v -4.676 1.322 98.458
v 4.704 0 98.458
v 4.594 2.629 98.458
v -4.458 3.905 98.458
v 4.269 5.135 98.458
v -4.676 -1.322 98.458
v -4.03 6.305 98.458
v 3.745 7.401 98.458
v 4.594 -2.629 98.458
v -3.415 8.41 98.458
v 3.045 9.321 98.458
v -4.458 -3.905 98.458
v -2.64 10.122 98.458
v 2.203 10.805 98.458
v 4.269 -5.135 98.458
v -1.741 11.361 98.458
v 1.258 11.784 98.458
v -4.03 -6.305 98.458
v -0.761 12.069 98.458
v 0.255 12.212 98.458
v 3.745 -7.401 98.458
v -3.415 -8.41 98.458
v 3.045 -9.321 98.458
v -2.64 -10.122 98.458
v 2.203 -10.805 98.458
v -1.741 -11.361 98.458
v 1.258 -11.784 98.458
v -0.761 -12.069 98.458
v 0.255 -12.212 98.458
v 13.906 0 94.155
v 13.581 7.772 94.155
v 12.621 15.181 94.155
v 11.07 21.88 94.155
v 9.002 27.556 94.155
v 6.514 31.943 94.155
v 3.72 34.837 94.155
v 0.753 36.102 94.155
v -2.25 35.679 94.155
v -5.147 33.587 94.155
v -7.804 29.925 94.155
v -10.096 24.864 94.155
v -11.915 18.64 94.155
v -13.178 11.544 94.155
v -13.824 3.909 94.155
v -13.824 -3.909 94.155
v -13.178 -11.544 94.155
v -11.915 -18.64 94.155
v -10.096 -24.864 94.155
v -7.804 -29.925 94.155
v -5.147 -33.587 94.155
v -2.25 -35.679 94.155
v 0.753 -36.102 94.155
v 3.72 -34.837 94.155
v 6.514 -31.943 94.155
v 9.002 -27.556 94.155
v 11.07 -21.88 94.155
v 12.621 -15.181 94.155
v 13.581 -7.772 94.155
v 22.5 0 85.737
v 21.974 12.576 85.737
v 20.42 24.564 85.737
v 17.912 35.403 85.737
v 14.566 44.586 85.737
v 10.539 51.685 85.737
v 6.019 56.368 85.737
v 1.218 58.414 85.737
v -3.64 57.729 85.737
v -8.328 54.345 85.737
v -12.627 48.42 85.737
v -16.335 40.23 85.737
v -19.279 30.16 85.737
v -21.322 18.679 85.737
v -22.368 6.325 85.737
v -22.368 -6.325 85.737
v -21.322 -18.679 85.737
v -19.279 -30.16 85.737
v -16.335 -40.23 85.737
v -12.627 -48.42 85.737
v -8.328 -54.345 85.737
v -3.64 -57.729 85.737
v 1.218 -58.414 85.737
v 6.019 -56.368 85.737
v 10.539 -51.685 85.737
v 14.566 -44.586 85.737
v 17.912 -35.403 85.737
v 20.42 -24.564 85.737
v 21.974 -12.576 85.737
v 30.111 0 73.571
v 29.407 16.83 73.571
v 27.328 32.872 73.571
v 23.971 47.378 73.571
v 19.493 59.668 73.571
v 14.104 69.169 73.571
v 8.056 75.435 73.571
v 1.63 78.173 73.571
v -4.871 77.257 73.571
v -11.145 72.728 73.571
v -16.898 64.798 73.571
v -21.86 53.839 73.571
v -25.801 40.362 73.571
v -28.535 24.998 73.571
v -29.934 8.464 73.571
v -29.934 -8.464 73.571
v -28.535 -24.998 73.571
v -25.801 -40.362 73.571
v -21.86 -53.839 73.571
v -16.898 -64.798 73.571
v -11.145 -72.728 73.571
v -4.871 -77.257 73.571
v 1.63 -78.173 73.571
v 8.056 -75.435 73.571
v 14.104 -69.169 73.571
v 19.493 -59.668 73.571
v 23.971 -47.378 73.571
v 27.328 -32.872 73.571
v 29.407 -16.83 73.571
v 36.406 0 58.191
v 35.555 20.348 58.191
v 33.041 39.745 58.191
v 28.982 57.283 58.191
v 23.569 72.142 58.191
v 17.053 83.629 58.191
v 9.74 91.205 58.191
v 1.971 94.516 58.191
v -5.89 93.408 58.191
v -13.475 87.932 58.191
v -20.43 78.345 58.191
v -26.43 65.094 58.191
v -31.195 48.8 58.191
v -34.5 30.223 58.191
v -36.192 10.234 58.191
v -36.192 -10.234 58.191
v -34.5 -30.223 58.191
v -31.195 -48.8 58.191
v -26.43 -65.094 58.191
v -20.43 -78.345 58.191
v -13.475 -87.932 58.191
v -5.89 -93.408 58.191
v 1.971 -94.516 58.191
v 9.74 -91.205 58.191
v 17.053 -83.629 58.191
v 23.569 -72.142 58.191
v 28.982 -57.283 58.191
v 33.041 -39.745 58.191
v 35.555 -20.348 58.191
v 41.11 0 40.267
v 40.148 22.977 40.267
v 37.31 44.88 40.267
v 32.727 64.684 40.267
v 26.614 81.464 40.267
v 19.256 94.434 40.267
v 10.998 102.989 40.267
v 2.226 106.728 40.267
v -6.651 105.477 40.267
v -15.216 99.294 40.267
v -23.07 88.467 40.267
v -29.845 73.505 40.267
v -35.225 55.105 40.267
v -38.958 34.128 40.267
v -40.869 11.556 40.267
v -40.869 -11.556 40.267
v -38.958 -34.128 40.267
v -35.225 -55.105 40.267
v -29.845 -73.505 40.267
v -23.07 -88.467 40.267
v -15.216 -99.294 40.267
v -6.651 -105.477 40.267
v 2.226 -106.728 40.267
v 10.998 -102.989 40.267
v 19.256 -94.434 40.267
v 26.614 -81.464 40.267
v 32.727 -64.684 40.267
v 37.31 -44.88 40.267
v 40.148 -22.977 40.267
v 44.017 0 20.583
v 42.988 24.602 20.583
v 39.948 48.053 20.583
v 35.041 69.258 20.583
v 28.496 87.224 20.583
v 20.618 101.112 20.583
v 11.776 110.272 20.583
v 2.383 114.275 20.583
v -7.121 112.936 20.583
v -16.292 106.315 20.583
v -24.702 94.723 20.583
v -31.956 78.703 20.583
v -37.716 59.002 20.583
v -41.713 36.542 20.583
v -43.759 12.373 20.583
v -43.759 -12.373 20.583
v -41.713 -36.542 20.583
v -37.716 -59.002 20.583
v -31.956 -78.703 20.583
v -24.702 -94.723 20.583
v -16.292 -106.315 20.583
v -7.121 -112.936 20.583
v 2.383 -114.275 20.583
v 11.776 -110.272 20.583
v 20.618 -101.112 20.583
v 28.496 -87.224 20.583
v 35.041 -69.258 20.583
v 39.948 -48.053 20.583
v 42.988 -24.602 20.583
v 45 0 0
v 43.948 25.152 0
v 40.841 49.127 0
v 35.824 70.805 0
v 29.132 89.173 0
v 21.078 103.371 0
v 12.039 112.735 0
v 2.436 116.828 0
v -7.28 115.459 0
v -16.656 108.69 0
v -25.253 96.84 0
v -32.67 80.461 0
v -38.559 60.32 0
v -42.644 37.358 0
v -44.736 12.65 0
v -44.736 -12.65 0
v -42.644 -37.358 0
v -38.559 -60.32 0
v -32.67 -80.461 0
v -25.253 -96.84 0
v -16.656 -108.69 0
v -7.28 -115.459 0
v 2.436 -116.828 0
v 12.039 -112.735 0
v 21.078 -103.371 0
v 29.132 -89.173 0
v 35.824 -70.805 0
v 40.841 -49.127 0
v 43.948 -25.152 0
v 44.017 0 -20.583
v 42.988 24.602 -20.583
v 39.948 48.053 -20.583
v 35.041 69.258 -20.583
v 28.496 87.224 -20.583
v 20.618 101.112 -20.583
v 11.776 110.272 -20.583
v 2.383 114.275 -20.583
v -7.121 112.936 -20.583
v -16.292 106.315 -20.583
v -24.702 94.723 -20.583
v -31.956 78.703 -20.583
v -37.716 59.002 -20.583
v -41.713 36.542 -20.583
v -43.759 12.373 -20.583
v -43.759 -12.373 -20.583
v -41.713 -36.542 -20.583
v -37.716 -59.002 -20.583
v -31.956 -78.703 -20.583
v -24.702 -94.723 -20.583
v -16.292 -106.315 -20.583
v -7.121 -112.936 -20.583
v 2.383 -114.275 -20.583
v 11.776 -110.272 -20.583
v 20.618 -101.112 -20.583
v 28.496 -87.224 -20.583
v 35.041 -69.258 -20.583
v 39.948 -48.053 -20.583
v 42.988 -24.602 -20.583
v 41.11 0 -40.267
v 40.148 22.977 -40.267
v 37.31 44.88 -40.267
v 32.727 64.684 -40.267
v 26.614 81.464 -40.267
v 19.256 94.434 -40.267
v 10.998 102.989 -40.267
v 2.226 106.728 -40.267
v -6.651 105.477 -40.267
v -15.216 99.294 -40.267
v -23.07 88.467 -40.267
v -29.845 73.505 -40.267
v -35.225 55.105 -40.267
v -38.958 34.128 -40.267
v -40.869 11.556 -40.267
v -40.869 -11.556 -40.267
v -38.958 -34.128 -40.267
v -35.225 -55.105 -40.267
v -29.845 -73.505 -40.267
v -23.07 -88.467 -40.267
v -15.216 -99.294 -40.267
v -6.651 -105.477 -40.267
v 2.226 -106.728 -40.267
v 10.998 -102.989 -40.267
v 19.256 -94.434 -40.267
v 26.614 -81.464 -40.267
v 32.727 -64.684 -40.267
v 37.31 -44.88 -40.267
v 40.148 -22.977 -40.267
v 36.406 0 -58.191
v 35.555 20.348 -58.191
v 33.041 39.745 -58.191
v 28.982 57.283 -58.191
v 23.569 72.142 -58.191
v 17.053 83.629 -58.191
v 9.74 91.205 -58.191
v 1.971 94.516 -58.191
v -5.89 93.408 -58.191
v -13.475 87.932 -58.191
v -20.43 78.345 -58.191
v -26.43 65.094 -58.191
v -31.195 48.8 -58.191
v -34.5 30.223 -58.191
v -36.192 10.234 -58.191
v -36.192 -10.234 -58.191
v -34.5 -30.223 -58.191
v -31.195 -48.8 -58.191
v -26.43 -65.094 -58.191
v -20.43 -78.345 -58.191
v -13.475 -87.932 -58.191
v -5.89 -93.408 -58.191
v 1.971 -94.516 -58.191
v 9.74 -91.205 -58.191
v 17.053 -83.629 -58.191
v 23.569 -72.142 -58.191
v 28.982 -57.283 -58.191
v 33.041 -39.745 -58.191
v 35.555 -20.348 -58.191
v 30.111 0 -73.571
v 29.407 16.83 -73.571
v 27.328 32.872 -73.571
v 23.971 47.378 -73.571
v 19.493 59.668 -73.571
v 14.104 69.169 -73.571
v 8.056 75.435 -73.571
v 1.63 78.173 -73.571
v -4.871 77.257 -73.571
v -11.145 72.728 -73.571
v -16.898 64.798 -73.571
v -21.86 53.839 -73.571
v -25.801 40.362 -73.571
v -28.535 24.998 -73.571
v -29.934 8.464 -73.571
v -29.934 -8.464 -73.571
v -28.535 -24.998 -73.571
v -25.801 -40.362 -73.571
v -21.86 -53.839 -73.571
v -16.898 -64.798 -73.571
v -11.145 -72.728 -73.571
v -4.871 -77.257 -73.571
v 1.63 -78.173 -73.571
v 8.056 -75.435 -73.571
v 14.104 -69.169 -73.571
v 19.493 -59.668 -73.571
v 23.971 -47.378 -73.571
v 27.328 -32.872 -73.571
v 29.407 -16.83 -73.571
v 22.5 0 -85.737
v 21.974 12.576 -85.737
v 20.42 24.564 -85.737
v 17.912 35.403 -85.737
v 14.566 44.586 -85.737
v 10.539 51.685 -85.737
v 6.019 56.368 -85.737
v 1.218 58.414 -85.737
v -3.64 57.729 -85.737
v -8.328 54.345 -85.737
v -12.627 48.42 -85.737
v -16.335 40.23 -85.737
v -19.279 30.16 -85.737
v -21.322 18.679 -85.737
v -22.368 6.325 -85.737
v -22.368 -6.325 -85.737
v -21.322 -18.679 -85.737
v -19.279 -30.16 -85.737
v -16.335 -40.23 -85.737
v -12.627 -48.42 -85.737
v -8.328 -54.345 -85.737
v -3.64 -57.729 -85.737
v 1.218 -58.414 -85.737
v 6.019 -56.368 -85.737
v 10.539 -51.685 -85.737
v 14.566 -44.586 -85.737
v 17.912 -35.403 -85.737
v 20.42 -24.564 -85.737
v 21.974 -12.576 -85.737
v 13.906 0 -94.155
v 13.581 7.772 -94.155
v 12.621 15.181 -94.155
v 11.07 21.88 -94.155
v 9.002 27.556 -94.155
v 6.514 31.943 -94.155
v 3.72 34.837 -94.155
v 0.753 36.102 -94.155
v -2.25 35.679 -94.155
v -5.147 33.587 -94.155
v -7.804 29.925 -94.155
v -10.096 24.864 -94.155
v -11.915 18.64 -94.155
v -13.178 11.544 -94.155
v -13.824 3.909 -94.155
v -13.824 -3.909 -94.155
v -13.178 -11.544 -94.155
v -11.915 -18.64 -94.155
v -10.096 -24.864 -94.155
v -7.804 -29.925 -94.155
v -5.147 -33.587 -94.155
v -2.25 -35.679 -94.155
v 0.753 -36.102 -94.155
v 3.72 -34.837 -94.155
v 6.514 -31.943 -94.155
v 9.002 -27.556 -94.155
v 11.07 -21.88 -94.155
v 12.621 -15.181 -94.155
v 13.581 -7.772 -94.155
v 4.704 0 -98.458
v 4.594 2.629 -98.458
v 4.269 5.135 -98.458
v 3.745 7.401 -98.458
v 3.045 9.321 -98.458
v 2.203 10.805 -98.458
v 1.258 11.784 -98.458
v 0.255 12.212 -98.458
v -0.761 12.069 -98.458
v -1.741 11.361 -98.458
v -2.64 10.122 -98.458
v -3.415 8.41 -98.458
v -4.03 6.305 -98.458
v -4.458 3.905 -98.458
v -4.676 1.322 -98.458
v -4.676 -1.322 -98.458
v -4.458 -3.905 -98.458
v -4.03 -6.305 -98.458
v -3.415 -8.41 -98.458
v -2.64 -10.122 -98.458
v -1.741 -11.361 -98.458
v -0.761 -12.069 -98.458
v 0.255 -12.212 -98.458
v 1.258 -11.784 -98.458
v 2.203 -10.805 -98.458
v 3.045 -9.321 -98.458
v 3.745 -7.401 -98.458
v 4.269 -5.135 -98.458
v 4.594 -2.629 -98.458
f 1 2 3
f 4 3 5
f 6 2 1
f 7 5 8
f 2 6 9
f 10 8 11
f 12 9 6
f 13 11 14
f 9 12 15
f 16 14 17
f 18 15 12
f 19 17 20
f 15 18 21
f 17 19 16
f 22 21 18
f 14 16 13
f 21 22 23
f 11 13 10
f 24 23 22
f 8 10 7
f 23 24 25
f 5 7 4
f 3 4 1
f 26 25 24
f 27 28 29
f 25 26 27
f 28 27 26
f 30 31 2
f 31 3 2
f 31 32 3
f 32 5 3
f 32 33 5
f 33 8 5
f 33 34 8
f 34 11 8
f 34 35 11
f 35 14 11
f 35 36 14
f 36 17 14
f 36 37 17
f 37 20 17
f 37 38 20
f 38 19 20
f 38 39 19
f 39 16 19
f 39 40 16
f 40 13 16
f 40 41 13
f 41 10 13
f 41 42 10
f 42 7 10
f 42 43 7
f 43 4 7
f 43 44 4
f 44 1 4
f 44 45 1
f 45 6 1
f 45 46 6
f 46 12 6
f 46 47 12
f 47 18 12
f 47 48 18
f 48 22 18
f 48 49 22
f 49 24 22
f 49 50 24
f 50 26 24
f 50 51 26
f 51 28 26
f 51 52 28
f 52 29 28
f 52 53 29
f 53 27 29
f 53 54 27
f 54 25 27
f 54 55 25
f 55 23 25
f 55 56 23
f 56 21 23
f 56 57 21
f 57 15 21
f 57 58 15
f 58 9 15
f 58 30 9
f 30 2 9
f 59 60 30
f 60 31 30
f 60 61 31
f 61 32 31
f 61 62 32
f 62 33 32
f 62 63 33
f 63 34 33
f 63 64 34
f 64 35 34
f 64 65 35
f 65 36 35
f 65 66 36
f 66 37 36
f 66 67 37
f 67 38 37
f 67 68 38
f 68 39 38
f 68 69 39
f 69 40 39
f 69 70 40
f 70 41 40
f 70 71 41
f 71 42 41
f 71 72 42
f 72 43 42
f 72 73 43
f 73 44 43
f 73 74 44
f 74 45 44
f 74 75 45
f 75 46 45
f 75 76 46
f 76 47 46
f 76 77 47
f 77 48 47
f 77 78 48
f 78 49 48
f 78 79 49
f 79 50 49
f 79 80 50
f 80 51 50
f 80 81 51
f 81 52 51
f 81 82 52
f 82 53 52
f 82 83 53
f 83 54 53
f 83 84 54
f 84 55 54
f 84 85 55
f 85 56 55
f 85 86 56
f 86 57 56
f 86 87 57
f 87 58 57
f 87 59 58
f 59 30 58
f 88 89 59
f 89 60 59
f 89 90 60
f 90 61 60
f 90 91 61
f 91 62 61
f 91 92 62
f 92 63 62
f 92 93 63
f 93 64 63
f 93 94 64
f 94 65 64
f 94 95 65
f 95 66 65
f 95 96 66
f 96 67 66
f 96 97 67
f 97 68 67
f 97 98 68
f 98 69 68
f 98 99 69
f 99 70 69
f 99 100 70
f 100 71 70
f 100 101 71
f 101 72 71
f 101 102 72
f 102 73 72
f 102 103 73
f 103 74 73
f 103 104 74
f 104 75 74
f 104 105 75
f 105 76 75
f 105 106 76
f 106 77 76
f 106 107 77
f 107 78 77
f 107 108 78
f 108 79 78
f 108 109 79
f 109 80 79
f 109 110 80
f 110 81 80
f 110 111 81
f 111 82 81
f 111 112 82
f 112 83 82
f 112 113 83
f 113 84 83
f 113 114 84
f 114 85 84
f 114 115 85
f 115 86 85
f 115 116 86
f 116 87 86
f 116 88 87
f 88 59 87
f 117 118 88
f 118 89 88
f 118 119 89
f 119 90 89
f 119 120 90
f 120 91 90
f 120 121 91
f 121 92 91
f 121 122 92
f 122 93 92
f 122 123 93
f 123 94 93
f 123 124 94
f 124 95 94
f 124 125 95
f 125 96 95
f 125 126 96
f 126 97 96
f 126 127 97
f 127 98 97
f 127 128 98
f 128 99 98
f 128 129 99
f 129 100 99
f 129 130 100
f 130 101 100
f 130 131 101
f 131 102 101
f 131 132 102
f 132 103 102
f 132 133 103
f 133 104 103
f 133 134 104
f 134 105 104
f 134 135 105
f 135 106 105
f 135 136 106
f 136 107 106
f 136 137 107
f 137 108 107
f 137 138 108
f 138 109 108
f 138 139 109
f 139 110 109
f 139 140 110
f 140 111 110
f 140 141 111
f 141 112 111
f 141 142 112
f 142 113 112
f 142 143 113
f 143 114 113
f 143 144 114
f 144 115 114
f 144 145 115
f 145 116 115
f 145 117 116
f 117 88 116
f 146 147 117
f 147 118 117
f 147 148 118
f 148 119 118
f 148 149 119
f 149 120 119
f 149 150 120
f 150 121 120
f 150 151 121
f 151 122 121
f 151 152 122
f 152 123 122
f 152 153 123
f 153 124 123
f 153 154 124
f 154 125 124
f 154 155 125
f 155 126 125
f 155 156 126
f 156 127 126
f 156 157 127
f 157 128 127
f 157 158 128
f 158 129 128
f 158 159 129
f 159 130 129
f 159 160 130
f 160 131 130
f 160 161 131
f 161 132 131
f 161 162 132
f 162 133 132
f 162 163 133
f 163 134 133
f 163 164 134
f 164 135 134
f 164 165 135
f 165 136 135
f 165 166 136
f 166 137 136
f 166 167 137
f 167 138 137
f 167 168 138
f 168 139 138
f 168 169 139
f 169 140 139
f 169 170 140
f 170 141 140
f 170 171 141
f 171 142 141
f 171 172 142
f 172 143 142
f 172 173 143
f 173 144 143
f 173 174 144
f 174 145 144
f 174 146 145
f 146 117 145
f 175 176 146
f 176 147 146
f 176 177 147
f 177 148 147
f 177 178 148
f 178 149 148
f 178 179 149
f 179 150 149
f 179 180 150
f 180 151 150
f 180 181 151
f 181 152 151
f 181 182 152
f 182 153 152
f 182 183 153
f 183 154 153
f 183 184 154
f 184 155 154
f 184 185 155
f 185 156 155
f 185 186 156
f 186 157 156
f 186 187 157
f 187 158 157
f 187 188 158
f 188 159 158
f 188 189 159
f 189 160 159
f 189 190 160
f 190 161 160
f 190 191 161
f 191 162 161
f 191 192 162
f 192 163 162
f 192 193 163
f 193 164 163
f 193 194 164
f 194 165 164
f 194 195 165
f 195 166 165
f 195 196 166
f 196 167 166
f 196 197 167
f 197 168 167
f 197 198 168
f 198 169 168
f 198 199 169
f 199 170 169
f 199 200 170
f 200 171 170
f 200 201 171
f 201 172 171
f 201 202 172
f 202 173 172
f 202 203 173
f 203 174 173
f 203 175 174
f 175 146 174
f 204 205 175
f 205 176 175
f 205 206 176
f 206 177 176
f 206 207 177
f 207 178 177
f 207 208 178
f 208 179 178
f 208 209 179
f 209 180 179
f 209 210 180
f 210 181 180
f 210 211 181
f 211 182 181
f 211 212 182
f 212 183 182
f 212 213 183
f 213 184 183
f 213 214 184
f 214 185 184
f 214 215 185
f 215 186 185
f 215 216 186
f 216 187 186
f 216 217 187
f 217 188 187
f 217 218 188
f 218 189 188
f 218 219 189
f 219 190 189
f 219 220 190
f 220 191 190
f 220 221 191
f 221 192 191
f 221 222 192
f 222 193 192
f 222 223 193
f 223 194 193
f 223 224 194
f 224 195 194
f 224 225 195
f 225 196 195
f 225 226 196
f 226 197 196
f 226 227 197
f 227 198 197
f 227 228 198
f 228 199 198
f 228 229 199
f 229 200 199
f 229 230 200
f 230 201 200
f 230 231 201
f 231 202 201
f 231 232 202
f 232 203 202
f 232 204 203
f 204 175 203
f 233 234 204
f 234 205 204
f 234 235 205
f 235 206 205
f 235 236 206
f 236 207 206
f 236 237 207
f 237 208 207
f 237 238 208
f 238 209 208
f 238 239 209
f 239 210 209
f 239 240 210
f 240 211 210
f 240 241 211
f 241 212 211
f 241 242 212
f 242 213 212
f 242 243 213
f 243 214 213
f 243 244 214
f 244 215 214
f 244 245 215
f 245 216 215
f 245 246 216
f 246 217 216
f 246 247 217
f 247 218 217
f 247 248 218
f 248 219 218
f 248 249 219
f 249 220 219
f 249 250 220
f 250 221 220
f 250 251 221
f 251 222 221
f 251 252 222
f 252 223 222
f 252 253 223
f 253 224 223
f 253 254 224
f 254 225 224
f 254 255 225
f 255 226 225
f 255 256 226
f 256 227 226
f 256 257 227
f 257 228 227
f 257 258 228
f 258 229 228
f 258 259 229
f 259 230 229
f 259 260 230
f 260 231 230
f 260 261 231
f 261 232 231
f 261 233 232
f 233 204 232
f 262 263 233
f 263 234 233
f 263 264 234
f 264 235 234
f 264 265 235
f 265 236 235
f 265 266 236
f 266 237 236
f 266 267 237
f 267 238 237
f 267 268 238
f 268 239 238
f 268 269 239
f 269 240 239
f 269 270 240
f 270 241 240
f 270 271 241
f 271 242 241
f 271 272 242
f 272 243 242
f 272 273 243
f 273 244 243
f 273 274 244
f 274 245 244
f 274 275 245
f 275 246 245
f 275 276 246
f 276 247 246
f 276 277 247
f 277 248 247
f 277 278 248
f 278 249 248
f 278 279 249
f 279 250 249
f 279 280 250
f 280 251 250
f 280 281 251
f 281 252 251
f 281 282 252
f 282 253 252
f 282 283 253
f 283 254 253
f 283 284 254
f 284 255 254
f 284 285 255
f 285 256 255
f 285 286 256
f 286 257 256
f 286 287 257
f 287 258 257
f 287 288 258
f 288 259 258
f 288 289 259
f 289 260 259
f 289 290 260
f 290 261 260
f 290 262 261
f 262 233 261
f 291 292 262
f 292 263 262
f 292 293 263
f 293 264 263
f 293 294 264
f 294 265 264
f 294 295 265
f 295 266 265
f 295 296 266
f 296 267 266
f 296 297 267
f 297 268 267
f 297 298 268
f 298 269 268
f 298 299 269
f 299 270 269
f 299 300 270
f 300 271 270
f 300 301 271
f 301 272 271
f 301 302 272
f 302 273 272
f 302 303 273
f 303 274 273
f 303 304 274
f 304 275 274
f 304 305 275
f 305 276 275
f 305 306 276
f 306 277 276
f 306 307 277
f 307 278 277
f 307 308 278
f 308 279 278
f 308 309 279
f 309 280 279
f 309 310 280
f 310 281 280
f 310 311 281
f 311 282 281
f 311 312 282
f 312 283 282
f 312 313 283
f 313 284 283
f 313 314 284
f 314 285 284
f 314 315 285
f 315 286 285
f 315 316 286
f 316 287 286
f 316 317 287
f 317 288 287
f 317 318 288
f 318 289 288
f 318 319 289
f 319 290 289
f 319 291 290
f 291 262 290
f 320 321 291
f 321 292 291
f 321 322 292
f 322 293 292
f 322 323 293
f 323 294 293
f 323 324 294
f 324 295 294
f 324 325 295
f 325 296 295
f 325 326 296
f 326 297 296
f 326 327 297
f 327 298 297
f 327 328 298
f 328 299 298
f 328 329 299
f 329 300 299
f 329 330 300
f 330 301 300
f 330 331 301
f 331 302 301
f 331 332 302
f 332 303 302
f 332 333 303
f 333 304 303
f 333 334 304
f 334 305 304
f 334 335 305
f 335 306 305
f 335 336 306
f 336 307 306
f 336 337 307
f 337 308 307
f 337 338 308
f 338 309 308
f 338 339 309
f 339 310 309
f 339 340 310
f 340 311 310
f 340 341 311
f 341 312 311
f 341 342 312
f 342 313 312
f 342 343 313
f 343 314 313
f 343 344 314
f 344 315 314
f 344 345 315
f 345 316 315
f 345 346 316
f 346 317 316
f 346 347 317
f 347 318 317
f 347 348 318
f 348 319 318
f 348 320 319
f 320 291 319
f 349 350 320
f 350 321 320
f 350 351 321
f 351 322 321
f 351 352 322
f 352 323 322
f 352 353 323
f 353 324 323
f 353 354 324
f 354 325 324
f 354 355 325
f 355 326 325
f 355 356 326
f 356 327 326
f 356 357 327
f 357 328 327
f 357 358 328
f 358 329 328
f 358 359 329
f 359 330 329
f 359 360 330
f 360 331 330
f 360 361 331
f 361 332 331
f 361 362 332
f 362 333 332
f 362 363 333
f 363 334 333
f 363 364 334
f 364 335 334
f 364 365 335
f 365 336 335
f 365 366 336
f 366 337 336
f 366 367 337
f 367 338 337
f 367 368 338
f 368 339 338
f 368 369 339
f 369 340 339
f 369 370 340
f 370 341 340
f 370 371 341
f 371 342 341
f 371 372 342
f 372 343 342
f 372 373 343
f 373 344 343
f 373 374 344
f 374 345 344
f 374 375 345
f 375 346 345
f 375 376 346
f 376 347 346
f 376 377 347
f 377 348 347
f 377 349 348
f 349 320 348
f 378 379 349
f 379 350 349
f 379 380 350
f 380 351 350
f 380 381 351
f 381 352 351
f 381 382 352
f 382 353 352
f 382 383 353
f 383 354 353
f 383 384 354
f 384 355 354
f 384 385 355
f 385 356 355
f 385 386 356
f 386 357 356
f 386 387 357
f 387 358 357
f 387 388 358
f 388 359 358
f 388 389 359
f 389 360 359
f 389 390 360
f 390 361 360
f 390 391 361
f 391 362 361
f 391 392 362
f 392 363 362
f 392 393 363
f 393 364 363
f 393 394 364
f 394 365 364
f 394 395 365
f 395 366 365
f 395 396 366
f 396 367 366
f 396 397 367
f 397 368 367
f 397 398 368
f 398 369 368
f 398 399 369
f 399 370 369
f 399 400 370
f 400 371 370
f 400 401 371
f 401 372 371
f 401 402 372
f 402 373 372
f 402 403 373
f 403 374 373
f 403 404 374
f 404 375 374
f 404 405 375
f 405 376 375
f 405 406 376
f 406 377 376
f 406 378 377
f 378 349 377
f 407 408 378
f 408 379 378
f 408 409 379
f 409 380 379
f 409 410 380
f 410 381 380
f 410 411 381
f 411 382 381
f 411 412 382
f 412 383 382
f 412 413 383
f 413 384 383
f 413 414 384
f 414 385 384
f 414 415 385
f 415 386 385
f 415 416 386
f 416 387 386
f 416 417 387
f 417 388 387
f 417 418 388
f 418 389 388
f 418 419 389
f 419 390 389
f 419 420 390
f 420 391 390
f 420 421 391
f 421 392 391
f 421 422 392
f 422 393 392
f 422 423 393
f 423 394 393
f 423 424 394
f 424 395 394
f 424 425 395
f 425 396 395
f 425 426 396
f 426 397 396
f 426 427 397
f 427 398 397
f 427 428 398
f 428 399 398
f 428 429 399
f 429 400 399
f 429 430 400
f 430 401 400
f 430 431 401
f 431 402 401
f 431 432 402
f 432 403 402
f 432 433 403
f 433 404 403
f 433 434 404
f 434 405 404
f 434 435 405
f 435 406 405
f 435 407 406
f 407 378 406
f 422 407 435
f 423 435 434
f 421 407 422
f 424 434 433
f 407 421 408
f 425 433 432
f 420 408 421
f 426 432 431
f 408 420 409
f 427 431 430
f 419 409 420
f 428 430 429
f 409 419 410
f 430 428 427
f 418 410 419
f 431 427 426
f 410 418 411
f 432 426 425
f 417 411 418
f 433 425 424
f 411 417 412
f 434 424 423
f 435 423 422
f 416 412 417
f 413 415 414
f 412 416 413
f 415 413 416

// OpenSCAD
// Generated by SolidPython 1.0.1 on 2020-07-29 00:46:46


scale(v = [5, 13, 11]) {
	sphere(r = 9);
}
/***********************************************
*********      SolidPython code:      **********
************************************************
 
# import packages: SolidPython
from solid import *
from solid.utils import *
from itertools import chain, combinations, permutations


class Resize:

    def __init__(self, scad_file):
        self.scad_file = scad_file
        #self.scad_file = import_scad(scad_file)
        # cone/cylinder param:
        self.r1 = 0
        self.r2 = 0
        self.h = 0
        # rectangular prism param:
        self.w = 0
        self.l = 0
        # ellipse param:
        self.r = 0

    # import OpenScad code (file name corresponds to shape)


    # classify shape + parameters
    def assign(self, param1, param2, param3):
        if self.scad_file == 'cone.scad':
            self.r1 = param1
            self.r2 = param2
            self.h = param3
        elif self.scad_file == 'cylinder.scad':
            self.r1 = param1
            self.r2 = param2
            self.h = param3
        elif self.scad_file == 'rectangularPrism.scad':
            self.h = param1
            self.l = param2
            self.w = param3
        else:
            self.r = param1
            self.h = param2

    # resize parameters
    def iterate(self):
        x = range(3, 20, 2)
        i = 1
        if self.scad_file == 'cone.scad':
            tempList = list(permutations(x, 2))
            for temp in tempList:
                param1 = temp[0]
                param2 = temp[1]
                filepath = 'produced_scad_files/' + 'cone' + str(param1) + '_' + str(param2) + '_' + '.scad'
                scad_render_to_file(cylinder(h=param1, r1=param2, r2=0), filepath)

        elif self.scad_file == 'cylinder.scad':
            tempList = list(permutations(x, 3))
            for temp in tempList:
                param1 = temp[0]
                param2 = temp[1]
                filepath = 'produced_scad_files/' + 'cylinder' + str(param1) + '_' + str(param2) + '_' + '.scad'
                scad_render_to_file(cylinder(h=param1, r1=param2, r2=param2), filepath)

        elif self.scad_file == 'rectangularPrism.scad':
            tempList = list(permutations(x, 3))
            for temp in tempList:
                param1 = temp[0]
                param2 = temp[1]
                param3 = temp[2]
                filepath = 'produced_scad_files/' + 'rectangularPrism' + str(param1) + '_' + str(param2) + '_' + str(
                    param3) + '.scad'
                scad_render_to_file(cube(size=(param1, param2, param3)), filepath)

        elif self.scad_file == 'ellipse.scad':
            tempList = list(permutations(x, 4))
            for temp in tempList:
                param1 = temp[0]
                param2 = temp[1]
                param3 = temp[2]
                param4 = temp[3]
                filepath = 'produced_scad_files/' + 'ellipse' + str(param1) + '_' + str(param2) + '_' + str(param3) + '_' + str(param4) + '.scad'
                scad_render_to_file(scale([param1, param2, param3])(sphere(r=param4)), filepath)

    def render_to_scadfile(self):
        scad_render_to_file(scad, 'example.scad') 
 
************************************************/
